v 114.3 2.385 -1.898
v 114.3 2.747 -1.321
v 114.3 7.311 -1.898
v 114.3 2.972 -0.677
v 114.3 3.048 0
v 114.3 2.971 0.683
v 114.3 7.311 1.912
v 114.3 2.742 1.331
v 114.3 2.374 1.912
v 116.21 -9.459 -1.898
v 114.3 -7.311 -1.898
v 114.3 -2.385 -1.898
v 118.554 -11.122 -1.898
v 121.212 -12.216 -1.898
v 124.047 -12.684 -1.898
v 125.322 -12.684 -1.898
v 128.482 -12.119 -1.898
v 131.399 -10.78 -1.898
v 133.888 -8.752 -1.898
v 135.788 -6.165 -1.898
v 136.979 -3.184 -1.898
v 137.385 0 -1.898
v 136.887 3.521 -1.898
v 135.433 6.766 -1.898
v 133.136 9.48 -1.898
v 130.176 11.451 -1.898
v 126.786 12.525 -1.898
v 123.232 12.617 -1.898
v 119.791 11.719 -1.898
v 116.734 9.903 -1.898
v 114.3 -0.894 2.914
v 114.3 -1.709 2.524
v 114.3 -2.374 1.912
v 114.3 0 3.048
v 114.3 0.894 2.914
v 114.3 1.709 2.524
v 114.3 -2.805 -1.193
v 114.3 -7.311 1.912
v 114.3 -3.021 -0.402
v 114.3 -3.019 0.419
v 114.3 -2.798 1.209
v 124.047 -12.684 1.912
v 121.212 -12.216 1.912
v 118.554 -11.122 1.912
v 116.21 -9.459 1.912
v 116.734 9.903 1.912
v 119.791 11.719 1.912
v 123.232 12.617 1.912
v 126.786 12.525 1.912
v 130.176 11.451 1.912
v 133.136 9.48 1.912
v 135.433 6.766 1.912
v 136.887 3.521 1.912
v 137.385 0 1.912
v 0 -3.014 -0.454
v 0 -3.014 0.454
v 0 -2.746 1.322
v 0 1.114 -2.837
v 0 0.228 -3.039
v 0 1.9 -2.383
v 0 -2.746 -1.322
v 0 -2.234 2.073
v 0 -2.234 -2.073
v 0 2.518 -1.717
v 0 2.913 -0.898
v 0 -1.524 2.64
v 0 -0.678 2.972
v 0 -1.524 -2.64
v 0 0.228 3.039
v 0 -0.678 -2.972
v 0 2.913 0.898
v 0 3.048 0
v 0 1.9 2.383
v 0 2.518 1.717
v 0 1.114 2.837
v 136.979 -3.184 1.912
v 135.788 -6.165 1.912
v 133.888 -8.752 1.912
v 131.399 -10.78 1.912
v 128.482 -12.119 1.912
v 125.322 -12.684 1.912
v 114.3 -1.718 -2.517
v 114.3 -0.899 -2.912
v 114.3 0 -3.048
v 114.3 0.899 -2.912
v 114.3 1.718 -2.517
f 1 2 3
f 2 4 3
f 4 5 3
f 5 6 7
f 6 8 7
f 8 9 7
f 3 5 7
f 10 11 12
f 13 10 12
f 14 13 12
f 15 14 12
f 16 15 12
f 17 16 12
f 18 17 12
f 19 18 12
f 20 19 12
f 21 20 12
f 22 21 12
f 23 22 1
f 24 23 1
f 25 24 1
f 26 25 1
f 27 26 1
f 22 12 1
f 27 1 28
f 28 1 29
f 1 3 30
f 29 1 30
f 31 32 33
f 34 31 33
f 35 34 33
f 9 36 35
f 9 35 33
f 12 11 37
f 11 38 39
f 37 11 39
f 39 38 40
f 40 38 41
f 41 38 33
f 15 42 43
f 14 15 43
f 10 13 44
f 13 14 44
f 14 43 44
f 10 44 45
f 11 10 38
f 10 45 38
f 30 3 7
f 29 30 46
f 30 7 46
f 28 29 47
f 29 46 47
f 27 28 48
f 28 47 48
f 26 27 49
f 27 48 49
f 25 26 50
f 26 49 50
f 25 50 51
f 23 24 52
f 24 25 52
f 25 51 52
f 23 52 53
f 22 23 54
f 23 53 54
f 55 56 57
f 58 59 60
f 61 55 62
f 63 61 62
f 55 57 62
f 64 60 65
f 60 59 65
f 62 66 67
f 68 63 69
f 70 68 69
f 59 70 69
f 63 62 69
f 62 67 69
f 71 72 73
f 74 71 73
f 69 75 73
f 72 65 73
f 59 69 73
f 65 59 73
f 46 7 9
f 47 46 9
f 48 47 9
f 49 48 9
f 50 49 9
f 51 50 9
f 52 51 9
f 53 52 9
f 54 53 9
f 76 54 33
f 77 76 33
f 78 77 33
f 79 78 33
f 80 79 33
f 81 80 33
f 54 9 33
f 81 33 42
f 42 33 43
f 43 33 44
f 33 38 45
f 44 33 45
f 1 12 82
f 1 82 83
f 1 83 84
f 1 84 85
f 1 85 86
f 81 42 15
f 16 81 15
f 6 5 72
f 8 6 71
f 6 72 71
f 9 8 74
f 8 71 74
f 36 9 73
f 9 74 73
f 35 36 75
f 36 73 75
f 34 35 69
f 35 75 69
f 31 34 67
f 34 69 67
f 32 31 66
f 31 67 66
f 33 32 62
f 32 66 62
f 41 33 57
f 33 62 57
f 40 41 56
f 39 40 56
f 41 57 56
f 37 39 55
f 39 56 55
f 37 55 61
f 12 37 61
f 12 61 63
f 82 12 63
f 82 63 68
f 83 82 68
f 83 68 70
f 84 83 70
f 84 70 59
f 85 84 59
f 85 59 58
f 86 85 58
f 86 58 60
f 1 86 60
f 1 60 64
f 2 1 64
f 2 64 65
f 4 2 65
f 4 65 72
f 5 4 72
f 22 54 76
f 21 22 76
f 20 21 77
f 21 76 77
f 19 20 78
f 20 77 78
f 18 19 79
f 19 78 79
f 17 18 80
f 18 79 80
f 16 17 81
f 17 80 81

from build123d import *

# Parameters (mm, degrees)
F0_R     = 3.048
F1_DEPTH = 114.3
F3_DEPTH = 25.4
F5_DEPTH = 25.4


with BuildPart() as f1:
    # F0 (on Right) → F1 (new body)
    with BuildSketch(Plane.YZ):
        Circle(F0_R)
    extrude(amount=F1_DEPTH)

    # F2 (on face) → F3 (join)
    with BuildSketch(Plane.YZ.offset(114.3)):
        with BuildLine():
            Line((-12.6839943098, -1.8982821818), (-2.3847072689, -1.8982821818))
            ThreePointArc((-2.3847072689, -1.8982821818), (-3.0479878513, 0.0086057166), (-2.3739500803, 1.9117178182))
            Line((-2.3739500803, 1.9117178182), (-12.6839943098, 1.9117178182))
            Line((-12.6839943098, 1.9117178182), (-12.6839943098, -1.8982821818))
        make_face()
        with BuildLine():
            Line((-2.3847072689, -1.8982821818), (2.3847072689, -1.8982821818))
            ThreePointArc((2.3847072689, -1.8982821818), (2.877402627, -1.0054144032), (3.048, 0))
            ThreePointArc((3.048, 0), (2.8745524734, 1.0135344482), (2.3739500803, 1.9117178182))
            Line((2.3739500803, 1.9117178182), (-2.3739500803, 1.9117178182))
            ThreePointArc((-2.3739500803, 1.9117178182), (-3.0479878513, 0.0086057166), (-2.3847072689, -1.8982821818))
        make_face()
        with BuildLine():
            Line((2.3847072689, -1.8982821818), (12.7160056902, -1.8982821818))
            Line((12.7160056902, -1.8982821818), (12.7160056902, 1.9117178182))
            Line((12.7160056902, 1.9117178182), (2.3739500803, 1.9117178182))
            ThreePointArc((2.3739500803, 1.9117178182), (2.8745524734, 1.0135344482), (3.048, 0))
            ThreePointArc((3.048, 0), (2.877402627, -1.0054144032), (2.3847072689, -1.8982821818))
        make_face()
    extrude(amount=F3_DEPTH)

    # F4 (on face) → F5 (cut)
    with BuildSketch(Plane.XY.offset(1.9117178182)):
        with BuildLine():
            ThreePointArc((114.3, 7.3106571527), (128.51905795, 12.1073757501), (137.3848106384, 0))
            ThreePointArc((137.3848106384, 0), (133.8876655087, -8.751997614), (125.3222181603, -12.6839943098))
            Line((125.3222181603, -12.6839943098), (139.7, -12.6839943098))
            Line((139.7, -12.6839943098), (139.7, 12.7160056902))
            Line((139.7, 12.7160056902), (114.3, 12.7160056902))
            Line((114.3, 12.7160056902), (114.3, 7.3106571527))
        make_face()
        with BuildLine():
            ThreePointArc((124.0474031165, -12.6839943098), (118.5537005151, -11.1220271828), (114.3, -7.3106571527))
            Line((114.3, -7.3106571527), (114.3, -12.6839943098))
            Line((114.3, -12.6839943098), (124.0474031165, -12.6839943098))
        make_face()
    extrude(amount=-F5_DEPTH, mode=Mode.SUBTRACT)


solid = f1.part
